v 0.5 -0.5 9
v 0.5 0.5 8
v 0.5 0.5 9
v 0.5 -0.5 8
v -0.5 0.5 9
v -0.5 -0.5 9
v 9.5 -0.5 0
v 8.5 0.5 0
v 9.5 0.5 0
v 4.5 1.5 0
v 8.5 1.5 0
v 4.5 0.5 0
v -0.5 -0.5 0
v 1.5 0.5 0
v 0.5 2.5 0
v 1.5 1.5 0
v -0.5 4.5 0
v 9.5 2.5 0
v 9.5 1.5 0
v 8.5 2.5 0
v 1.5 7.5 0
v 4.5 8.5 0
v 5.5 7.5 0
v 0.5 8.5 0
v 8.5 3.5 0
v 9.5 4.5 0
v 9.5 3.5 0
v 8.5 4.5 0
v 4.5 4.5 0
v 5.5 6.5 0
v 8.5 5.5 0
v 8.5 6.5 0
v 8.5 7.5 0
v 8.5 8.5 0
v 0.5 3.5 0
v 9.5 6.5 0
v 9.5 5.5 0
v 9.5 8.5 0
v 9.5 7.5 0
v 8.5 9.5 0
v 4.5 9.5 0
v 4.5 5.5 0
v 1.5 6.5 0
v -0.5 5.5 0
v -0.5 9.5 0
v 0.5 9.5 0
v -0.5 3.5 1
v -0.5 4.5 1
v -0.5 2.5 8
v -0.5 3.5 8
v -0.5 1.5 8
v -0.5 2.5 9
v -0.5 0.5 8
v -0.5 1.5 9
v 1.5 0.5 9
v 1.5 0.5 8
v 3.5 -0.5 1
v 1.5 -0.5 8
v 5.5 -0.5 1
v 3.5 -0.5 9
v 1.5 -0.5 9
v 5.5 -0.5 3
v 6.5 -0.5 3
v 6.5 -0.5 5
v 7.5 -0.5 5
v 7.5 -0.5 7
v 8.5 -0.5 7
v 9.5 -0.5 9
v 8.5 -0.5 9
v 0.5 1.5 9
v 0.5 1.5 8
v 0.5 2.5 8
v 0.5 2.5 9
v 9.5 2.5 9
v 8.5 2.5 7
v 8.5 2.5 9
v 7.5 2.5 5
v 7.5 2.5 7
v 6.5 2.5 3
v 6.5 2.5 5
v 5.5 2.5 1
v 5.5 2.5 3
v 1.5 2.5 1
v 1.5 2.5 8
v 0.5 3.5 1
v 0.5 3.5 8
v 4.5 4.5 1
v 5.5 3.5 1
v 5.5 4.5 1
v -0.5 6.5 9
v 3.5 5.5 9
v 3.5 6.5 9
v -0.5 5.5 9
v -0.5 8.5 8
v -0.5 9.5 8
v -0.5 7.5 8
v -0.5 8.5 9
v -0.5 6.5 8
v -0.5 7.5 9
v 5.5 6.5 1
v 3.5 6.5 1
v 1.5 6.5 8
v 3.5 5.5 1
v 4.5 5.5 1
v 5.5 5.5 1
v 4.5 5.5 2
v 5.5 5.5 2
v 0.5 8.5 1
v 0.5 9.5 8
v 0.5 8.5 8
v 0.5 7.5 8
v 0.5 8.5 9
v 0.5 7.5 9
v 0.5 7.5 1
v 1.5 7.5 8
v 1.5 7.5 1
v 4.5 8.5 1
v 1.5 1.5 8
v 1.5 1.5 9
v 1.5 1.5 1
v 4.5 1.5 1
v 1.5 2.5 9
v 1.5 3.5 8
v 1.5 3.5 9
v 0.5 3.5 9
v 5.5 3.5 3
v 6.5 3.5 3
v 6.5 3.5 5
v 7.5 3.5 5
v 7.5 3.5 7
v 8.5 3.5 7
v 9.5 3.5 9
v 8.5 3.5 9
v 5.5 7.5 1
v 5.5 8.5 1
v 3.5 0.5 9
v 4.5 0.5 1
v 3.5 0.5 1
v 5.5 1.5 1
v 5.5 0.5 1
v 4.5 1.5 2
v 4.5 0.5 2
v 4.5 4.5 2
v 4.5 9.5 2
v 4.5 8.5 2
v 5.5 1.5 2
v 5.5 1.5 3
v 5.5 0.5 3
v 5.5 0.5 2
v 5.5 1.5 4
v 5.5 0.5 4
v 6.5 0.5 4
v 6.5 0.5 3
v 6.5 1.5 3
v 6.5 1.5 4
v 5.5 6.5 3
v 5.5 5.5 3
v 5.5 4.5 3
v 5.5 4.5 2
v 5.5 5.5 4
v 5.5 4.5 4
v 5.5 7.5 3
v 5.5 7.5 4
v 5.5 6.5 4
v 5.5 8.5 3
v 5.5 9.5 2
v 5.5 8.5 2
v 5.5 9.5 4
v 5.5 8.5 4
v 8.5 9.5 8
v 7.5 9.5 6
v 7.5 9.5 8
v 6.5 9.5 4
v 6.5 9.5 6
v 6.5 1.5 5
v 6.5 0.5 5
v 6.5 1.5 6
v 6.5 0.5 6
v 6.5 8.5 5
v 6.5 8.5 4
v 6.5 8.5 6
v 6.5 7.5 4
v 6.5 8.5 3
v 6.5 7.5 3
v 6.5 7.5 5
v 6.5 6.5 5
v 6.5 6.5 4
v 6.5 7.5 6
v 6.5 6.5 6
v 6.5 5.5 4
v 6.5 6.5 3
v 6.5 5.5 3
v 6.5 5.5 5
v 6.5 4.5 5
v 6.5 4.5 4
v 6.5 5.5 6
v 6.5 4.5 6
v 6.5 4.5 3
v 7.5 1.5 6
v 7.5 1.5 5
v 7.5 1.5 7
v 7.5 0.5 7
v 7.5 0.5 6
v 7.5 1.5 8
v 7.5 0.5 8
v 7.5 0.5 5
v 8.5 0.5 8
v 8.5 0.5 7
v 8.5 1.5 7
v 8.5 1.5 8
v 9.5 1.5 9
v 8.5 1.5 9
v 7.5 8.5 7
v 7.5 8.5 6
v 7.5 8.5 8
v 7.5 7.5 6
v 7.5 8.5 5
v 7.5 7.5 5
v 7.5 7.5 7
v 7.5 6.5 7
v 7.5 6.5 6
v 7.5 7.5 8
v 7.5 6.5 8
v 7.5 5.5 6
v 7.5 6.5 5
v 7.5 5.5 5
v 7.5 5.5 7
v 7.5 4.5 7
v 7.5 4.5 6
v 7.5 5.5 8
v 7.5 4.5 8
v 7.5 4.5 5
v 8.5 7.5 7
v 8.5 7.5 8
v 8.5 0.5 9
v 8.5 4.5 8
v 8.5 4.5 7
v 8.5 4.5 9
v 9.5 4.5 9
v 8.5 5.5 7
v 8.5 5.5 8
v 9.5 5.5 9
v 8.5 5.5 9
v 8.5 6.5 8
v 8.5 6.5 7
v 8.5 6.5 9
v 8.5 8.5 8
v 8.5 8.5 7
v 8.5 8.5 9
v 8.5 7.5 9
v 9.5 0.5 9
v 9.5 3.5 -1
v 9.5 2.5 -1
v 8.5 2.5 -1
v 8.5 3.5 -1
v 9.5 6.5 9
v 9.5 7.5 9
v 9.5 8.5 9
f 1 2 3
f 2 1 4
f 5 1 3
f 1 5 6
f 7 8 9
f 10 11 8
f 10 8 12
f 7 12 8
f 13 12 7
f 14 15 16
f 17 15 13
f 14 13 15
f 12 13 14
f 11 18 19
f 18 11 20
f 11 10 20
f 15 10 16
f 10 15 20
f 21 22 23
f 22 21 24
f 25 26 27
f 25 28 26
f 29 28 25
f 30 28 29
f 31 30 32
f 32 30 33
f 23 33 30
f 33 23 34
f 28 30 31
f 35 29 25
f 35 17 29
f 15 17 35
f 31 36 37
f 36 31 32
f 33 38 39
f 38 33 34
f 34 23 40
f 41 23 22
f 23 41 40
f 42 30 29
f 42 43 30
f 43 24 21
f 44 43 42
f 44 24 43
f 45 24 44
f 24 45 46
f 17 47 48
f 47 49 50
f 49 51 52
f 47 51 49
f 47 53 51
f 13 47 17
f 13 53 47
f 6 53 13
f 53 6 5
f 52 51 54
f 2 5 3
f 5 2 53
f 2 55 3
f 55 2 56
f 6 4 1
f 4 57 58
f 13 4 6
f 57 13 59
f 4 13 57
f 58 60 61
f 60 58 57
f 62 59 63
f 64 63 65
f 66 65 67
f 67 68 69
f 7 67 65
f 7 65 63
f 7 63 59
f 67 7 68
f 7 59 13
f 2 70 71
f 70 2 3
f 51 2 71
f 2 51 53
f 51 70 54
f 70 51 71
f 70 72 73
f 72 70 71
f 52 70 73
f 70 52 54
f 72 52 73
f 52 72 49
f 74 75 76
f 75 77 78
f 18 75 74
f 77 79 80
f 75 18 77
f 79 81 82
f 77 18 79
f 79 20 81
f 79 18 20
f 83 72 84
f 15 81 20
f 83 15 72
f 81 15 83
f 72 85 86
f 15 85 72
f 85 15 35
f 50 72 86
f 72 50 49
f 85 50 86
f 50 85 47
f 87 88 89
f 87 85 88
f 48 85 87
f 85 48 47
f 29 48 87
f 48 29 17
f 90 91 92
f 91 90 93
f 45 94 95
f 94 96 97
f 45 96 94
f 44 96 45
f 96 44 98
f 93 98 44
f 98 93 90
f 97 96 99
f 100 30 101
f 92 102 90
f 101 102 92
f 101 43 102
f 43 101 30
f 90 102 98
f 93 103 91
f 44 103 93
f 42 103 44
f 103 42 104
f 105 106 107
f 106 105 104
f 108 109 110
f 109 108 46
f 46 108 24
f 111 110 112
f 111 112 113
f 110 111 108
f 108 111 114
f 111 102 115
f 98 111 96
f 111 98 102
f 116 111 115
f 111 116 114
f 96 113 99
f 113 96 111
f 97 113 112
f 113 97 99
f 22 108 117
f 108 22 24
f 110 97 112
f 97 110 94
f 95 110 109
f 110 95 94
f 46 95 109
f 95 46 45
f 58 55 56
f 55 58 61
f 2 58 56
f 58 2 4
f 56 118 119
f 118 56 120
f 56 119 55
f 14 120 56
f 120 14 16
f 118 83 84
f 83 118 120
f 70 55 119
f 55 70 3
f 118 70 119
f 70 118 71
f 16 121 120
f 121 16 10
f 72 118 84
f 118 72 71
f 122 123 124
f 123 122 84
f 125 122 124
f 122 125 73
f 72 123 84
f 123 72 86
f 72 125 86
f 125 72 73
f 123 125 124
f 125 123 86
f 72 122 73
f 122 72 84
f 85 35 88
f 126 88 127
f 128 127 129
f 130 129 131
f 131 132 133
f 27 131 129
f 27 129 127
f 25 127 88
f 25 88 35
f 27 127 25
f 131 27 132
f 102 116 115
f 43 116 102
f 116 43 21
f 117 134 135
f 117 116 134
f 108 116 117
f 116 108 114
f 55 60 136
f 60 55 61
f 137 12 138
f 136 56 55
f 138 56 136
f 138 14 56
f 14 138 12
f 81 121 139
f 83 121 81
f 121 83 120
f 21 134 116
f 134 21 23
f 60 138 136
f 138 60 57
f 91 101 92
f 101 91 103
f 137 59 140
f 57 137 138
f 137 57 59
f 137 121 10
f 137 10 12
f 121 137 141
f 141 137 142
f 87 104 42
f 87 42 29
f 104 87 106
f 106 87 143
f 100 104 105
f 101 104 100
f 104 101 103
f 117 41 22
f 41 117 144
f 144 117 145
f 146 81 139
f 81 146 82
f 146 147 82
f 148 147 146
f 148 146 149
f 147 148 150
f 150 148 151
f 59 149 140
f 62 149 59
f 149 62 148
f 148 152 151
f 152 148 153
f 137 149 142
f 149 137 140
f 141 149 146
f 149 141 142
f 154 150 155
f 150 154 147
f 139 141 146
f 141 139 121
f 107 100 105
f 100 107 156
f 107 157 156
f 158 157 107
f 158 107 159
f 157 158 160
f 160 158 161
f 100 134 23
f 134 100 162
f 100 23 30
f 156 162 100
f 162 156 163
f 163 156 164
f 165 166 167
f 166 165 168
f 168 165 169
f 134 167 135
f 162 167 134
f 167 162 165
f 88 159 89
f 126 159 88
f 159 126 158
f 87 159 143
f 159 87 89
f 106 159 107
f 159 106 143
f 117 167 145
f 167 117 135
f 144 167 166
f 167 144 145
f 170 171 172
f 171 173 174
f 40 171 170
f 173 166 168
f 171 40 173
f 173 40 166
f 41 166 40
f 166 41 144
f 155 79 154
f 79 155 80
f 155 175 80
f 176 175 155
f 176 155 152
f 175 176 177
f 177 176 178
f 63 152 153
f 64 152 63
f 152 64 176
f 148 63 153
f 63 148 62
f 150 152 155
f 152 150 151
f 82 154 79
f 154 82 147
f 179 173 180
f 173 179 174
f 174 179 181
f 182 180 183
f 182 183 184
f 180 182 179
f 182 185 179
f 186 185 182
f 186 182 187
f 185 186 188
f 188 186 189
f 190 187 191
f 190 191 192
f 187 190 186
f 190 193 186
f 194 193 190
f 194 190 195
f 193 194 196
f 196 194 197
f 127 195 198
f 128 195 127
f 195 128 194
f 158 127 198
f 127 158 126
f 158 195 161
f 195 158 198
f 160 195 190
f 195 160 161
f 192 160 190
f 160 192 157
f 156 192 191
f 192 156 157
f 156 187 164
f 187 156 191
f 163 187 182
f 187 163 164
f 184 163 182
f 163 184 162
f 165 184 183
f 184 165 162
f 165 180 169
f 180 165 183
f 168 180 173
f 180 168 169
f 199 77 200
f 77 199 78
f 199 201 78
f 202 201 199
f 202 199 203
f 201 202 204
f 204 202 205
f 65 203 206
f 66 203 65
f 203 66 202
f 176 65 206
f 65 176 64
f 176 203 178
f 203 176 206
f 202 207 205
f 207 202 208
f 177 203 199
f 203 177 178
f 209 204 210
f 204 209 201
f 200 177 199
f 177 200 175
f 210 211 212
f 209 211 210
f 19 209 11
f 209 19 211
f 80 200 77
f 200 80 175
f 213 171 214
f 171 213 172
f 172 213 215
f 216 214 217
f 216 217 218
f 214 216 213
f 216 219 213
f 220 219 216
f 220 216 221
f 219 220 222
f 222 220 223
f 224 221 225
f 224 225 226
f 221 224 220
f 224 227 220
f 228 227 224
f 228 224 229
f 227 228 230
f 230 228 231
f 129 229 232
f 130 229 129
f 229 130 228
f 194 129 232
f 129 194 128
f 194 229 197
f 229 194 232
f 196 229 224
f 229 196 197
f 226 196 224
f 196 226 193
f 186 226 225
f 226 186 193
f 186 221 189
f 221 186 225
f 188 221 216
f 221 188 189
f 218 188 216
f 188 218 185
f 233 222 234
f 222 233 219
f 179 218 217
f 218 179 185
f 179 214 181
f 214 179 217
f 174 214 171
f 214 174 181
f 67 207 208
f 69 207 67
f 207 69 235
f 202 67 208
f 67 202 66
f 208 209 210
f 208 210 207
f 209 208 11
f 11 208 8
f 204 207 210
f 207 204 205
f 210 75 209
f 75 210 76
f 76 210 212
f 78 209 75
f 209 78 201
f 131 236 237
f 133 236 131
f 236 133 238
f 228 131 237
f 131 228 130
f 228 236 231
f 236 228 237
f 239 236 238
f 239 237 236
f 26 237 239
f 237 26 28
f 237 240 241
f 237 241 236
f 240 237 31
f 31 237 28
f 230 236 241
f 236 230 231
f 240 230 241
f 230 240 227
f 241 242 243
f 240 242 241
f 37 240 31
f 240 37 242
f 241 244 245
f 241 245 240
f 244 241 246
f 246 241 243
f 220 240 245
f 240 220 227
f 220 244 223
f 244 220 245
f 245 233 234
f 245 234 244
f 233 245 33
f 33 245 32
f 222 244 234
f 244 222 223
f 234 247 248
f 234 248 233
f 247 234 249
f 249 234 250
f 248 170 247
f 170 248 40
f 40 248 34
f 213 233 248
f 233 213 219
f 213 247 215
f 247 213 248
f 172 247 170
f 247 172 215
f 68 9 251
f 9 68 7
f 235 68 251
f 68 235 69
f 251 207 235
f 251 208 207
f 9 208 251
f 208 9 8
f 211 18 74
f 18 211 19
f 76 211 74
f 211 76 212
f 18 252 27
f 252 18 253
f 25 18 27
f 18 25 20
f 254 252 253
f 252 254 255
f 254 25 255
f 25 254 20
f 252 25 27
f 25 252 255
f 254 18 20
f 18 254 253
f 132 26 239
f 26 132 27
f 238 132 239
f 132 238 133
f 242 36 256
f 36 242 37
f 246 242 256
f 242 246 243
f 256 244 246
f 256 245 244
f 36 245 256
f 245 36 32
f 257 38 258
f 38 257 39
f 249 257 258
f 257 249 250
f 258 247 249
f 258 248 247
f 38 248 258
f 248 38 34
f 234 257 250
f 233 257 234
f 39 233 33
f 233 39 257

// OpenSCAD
union() {
    translate([0, 0, 4.5]) cube([1, 1, 9], center=true);
    translate([0, 1, 4.0]) cube([1, 1, 8], center=true);
    translate([0, 2, 4.5]) cube([1, 1, 9], center=true);
    translate([0, 3, 4.0]) cube([1, 1, 8], center=true);
    translate([0, 4, 0.5]) cube([1, 1, 1], center=true);
    translate([0, 6, 4.5]) cube([1, 1, 9], center=true);
    translate([0, 7, 4.0]) cube([1, 1, 8], center=true);
    translate([0, 8, 4.5]) cube([1, 1, 9], center=true);
    translate([0, 9, 4.0]) cube([1, 1, 8], center=true);
    translate([1, 0, 4.0]) cube([1, 1, 8], center=true);
    translate([1, 1, 4.5]) cube([1, 1, 9], center=true);
    translate([1, 2, 4.0]) cube([1, 1, 8], center=true);
    translate([1, 3, 8.5]) color([0, 0, 1]) cube([1, 1, 1], center=true);
    translate([1, 4, 0.5]) cube([1, 1, 1], center=true);
    translate([1, 6, 4.5]) cube([1, 1, 9], center=true);
    translate([1, 7, 4.0]) cube([1, 1, 8], center=true);
    translate([1, 8, 0.5]) cube([1, 1, 1], center=true);
    translate([2, 0, 4.5]) cube([1, 1, 9], center=true);
    translate([2, 2, 0.5]) cube([1, 1, 1], center=true);
    translate([2, 4, 0.5]) cube([1, 1, 1], center=true);
    translate([2, 6, 4.5]) cube([1, 1, 9], center=true);
    translate([2, 8, 0.5]) cube([1, 1, 1], center=true);
    translate([3, 0, 4.5]) cube([1, 1, 9], center=true);
    translate([3, 2, 0.5]) cube([1, 1, 1], center=true);
    translate([3, 4, 0.5]) cube([1, 1, 1], center=true);
    translate([3, 6, 4.5]) cube([1, 1, 9], center=true);
    translate([3, 8, 0.5]) cube([1, 1, 1], center=true);
    translate([4, 0, 0.5]) cube([1, 1, 1], center=true);
    translate([4, 2, 0.5]) cube([1, 1, 1], center=true);
    translate([4, 4, 0.5]) cube([1, 1, 1], center=true);
    translate([4, 6, 0.5]) cube([1, 1, 1], center=true);
    translate([4, 8, 0.5]) cube([1, 1, 1], center=true);
    translate([5, 0, 0.5]) cube([1, 1, 1], center=true);
    translate([5, 1, 1.0]) cube([1, 1, 2], center=true);
    translate([5, 2, 0.5]) cube([1, 1, 1], center=true);
    translate([5, 4, 0.5]) cube([1, 1, 1], center=true);
    translate([5, 5, 1.0]) cube([1, 1, 2], center=true);
    translate([5, 6, 0.5]) cube([1, 1, 1], center=true);
    translate([5, 8, 0.5]) cube([1, 1, 1], center=true);
    translate([5, 9, 1.0]) cube([1, 1, 2], center=true);
    translate([6, 0, 1.5]) cube([1, 1, 3], center=true);
    translate([6, 1, 2.0]) cube([1, 1, 4], center=true);
    translate([6, 2, 1.5]) cube([1, 1, 3], center=true);
    translate([6, 4, 1.5]) cube([1, 1, 3], center=true);
    translate([6, 5, 2.0]) cube([1, 1, 4], center=true);
    translate([6, 6, 1.5]) cube([1, 1, 3], center=true);
    translate([6, 7, 2.0]) cube([1, 1, 4], center=true);
    translate([6, 8, 1.5]) cube([1, 1, 3], center=true);
    translate([6, 9, 2.0]) cube([1, 1, 4], center=true);
    translate([7, 0, 2.5]) cube([1, 1, 5], center=true);
    translate([7, 1, 3.0]) cube([1, 1, 6], center=true);
    translate([7, 2, 2.5]) cube([1, 1, 5], center=true);
    translate([7, 4, 2.5]) cube([1, 1, 5], center=true);
    translate([7, 5, 3.0]) cube([1, 1, 6], center=true);
    translate([7, 6, 2.5]) cube([1, 1, 5], center=true);
    translate([7, 7, 3.0]) cube([1, 1, 6], center=true);
    translate([7, 8, 2.5]) cube([1, 1, 5], center=true);
    translate([7, 9, 3.0]) cube([1, 1, 6], center=true);
    translate([8, 0, 3.5]) cube([1, 1, 7], center=true);
    translate([8, 1, 4.0]) cube([1, 1, 8], center=true);
    translate([8, 2, 3.5]) cube([1, 1, 7], center=true);
    translate([8, 4, 3.5]) cube([1, 1, 7], center=true);
    translate([8, 5, 4.0]) cube([1, 1, 8], center=true);
    translate([8, 6, 3.5]) cube([1, 1, 7], center=true);
    translate([8, 7, 4.0]) cube([1, 1, 8], center=true);
    translate([8, 8, 3.5]) cube([1, 1, 7], center=true);
    translate([8, 9, 4.0]) cube([1, 1, 8], center=true);
    translate([9, 0, 4.5]) cube([1, 1, 9], center=true);
    translate([9, 2, 4.5]) cube([1, 1, 9], center=true);
    translate([9, 3, -0.5]) color([1, 0, 0]) cube([1, 1, 1], center=true);
    translate([9, 4, 4.5]) cube([1, 1, 9], center=true);
    translate([9, 6, 4.5]) cube([1, 1, 9], center=true);
    translate([9, 8, 4.5]) cube([1, 1, 9], center=true);
}
